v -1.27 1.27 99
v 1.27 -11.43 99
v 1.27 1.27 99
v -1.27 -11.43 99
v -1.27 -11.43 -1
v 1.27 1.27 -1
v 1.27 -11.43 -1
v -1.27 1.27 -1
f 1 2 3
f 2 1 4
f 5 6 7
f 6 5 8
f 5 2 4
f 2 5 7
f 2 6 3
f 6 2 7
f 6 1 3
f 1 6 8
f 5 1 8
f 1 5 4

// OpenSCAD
translate([-1.27,-11.43,-1]) // Cropped pins
cube([2.54,12.7,100]);
